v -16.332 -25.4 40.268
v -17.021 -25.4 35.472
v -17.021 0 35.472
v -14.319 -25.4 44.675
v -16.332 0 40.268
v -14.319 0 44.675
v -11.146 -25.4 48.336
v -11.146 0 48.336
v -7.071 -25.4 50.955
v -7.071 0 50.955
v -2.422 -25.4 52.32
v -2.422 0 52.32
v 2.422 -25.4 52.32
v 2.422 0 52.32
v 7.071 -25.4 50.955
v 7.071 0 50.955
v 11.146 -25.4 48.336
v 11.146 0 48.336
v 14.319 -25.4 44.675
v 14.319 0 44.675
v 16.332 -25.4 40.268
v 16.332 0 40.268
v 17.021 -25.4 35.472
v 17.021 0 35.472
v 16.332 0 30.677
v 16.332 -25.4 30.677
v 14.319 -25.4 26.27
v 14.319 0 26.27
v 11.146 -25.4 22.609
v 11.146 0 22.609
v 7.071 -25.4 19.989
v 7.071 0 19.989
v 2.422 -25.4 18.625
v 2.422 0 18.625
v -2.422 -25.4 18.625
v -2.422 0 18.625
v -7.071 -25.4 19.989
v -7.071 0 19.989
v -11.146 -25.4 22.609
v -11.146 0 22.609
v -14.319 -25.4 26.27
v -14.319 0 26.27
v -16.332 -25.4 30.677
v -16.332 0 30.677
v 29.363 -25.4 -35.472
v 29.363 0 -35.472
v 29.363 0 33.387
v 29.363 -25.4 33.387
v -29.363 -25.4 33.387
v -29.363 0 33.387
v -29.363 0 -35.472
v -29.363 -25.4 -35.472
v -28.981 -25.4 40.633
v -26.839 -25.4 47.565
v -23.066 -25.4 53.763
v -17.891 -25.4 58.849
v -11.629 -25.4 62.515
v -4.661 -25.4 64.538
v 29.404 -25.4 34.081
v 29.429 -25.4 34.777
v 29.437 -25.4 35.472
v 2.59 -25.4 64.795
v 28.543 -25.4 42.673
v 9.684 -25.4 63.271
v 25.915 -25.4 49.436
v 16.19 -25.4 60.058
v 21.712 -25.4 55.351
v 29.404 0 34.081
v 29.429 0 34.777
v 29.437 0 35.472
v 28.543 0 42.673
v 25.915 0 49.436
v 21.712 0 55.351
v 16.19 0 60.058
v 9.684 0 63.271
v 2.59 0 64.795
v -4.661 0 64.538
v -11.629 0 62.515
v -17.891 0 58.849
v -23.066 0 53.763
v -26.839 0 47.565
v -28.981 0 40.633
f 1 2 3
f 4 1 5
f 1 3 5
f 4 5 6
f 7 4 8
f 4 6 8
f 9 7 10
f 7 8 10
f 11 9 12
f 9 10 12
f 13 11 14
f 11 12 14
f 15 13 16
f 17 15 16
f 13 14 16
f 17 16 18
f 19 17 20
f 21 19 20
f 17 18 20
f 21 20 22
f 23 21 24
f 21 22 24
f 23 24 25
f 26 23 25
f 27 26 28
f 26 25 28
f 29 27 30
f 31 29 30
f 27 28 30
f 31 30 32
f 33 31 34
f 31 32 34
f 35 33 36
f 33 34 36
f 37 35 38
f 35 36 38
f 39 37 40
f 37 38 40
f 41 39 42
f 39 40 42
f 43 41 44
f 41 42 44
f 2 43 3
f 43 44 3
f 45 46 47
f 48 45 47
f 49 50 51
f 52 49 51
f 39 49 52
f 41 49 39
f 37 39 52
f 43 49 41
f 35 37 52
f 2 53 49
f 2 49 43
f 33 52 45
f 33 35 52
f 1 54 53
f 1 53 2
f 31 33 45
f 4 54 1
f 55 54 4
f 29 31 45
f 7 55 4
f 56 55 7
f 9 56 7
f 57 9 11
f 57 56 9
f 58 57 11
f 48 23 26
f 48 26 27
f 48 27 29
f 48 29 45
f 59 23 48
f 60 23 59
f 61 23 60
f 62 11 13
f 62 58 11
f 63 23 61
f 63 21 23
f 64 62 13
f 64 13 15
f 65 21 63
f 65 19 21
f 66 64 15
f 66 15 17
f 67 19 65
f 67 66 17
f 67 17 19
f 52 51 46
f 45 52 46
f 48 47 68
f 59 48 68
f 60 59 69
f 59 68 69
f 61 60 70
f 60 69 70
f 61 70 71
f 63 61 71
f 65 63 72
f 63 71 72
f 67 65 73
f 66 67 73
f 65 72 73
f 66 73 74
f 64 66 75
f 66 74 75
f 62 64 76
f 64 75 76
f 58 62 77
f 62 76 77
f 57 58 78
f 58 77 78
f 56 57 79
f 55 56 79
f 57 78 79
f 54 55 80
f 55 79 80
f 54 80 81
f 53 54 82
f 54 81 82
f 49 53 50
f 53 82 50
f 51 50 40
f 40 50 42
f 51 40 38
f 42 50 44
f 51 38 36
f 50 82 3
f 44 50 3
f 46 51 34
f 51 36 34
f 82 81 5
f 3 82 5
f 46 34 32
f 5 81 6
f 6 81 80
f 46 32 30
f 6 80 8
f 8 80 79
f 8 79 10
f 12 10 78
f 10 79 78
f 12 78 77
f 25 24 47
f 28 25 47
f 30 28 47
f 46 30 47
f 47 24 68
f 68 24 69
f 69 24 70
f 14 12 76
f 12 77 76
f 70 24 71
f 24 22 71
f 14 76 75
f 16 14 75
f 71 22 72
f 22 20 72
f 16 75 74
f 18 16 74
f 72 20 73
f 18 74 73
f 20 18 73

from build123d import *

# Parameters (mm, degrees)
F1_DEPTH = 25.4


with BuildPart() as f1:
    # F0 (on Front) → F1 (new body)
    with BuildSketch(Plane.XZ):
        with BuildLine():
            ThreePointArc((-29.36328, 33.386896), (0, 6.035167), (29.36328, 33.386896))
            Line((29.36328, 33.386896), (29.36328, 35.472415))
            Line((29.36328, 35.472415), (17.021102, 35.472415))
            ThreePointArc((17.021102, 35.472415), (0, 18.451314), (-17.021102, 35.472415))
            Line((-17.021102, 35.472415), (-29.36328, 35.472415))
            Line((-29.36328, 35.472415), (-29.36328, 33.386896))
        make_face()
        with BuildLine():
            Line((-29.36328, -35.472415), (29.36328, -35.472415))
            Line((29.36328, -35.472415), (29.36328, 33.386896))
            ThreePointArc((29.36328, 33.386896), (0, 6.035167), (-29.36328, 33.386896))
            Line((-29.36328, 33.386896), (-29.36328, -35.472415))
        make_face()
        with BuildLine():
            Line((29.36328, 35.472415), (29.36328, 33.386896))
            ThreePointArc((29.36328, 33.386896), (29.418751, 34.429), (29.437249, 35.472415))
            ThreePointArc((29.437249, 35.472415), (-1.043415, 64.891166), (-29.36328, 33.386896))
            Line((-29.36328, 33.386896), (-29.36328, 35.472415))
            Line((-29.36328, 35.472415), (-17.021102, 35.472415))
            ThreePointArc((-17.021102, 35.472415), (0, 52.493517), (17.021102, 35.472415))
            Line((17.021102, 35.472415), (29.36328, 35.472415))
        make_face()
    extrude(amount=F1_DEPTH)


solid = f1.part
